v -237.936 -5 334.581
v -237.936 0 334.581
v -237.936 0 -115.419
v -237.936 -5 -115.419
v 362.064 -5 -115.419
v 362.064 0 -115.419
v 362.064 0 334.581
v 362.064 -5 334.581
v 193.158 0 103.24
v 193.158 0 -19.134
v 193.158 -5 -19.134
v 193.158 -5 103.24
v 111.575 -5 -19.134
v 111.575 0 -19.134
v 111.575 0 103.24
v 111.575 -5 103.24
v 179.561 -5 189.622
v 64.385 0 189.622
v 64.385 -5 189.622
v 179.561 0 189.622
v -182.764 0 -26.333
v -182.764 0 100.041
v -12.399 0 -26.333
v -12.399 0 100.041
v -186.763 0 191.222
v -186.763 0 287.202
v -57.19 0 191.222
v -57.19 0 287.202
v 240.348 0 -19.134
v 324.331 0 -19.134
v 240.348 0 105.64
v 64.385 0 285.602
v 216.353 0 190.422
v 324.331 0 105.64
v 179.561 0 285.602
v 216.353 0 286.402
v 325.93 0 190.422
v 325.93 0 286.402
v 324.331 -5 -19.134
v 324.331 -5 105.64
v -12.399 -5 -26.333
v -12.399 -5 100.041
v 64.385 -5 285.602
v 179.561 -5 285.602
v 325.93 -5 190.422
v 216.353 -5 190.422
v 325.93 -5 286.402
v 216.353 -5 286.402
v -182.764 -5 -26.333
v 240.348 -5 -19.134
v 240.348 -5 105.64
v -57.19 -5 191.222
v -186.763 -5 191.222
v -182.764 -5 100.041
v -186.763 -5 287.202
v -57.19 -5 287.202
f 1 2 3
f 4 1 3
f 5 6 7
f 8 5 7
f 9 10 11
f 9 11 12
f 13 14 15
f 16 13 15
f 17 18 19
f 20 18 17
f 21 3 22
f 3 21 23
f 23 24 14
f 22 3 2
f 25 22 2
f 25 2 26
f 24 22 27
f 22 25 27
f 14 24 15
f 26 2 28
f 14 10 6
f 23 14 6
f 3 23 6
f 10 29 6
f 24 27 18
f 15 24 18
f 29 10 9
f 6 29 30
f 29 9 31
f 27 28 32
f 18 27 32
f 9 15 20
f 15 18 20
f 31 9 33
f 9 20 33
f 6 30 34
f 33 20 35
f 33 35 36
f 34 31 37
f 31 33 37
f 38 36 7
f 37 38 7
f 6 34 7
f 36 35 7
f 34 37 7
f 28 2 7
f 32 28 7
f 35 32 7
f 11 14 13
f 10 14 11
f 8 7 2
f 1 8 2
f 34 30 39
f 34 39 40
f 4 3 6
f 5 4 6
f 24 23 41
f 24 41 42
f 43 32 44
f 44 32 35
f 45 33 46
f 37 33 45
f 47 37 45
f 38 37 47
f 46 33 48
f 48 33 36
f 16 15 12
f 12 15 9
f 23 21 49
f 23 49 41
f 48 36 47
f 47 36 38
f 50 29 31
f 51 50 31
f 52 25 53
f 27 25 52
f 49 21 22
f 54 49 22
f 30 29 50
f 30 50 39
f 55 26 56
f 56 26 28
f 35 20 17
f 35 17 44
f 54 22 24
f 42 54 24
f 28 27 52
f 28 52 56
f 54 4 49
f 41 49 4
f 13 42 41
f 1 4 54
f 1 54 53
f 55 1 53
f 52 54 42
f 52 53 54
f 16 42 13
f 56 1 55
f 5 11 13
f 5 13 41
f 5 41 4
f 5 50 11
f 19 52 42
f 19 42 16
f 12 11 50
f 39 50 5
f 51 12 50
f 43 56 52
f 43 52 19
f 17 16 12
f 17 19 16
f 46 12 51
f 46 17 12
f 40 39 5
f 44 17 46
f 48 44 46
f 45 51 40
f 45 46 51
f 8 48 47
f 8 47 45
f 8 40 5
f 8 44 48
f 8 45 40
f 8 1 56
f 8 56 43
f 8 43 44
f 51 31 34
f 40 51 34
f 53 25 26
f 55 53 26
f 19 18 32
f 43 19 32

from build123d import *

# Parameters (mm, degrees)
F0_W     = 170.3644944355
F0_H     = 126.3736598194
F0_W_2   = 81.582993269
F0_H_2   = 122.3744936287
F0_W_3   = 83.9825123549
F0_H_3   = 124.7739978135
F0_W_4   = 129.5729912817
F0_H_4   = 95.9800034761
F0_W_5   = 115.175999701
F0_W_6   = 109.5771491528
F1_DEPTH = 5
F2_DEPTH = 5


with BuildPart() as f1:
    # F0 (on Front) → F1 (new body)
    with BuildSketch(Plane.XZ):
        Polygon((362.0641423762, 334.581340097), (-237.9358576238, 334.581340097), (-237.9358576238, 127.1041715145), (-237.9358576238, 87.1041715145), (-237.9358576238, -115.418659903), (362.0641423762, -115.418659903), (362.0641423762, 87.1041715145), (362.0641423762, 109.581340097), (362.0641423762, 127.1041715145), align=None)
        with Locations((-97.5812994875, 36.853896454)):
            Rectangle(F0_W, F0_H, mode=Mode.SUBTRACT)
        with Locations((152.3666083813, 42.0528110117)):
            Rectangle(F0_W_2, F0_H_2, mode=Mode.SUBTRACT)
        with Locations((282.3395207524, 43.252563104)):
            Rectangle(F0_W_3, F0_H_3, mode=Mode.SUBTRACT)
        with Locations((-121.9762098044, 239.211730659)):
            Rectangle(F0_W_4, F0_H_4, mode=Mode.SUBTRACT)
        with Locations((121.9729445875, 237.6120612025)):
            Rectangle(F0_W_5, F0_H_4, mode=Mode.SUBTRACT)
        with Locations((271.1418420076, 238.4118959308)):
            Rectangle(F0_W_6, F0_H_4, mode=Mode.SUBTRACT)
    extrude(amount=F1_DEPTH)

    # F0 (on Front) → F2 (join)
    with BuildSketch(Plane.XZ):
        Polygon((362.0641423762, 334.581340097), (-237.9358576238, 334.581340097), (-237.9358576238, 127.1041715145), (-237.9358576238, 87.1041715145), (-237.9358576238, -115.418659903), (362.0641423762, -115.418659903), (362.0641423762, 87.1041715145), (362.0641423762, 109.581340097), (362.0641423762, 127.1041715145), align=None)
        with Locations((-97.5812994875, 36.853896454)):
            Rectangle(F0_W, F0_H, mode=Mode.SUBTRACT)
        with Locations((152.3666083813, 42.0528110117)):
            Rectangle(F0_W_2, F0_H_2, mode=Mode.SUBTRACT)
        with Locations((282.3395207524, 43.252563104)):
            Rectangle(F0_W_3, F0_H_3, mode=Mode.SUBTRACT)
        with Locations((-121.9762098044, 239.211730659)):
            Rectangle(F0_W_4, F0_H_4, mode=Mode.SUBTRACT)
        with Locations((121.9729445875, 237.6120612025)):
            Rectangle(F0_W_5, F0_H_4, mode=Mode.SUBTRACT)
        with Locations((271.1418420076, 238.4118959308)):
            Rectangle(F0_W_6, F0_H_4, mode=Mode.SUBTRACT)
    extrude(amount=F2_DEPTH)


solid = f1.part
